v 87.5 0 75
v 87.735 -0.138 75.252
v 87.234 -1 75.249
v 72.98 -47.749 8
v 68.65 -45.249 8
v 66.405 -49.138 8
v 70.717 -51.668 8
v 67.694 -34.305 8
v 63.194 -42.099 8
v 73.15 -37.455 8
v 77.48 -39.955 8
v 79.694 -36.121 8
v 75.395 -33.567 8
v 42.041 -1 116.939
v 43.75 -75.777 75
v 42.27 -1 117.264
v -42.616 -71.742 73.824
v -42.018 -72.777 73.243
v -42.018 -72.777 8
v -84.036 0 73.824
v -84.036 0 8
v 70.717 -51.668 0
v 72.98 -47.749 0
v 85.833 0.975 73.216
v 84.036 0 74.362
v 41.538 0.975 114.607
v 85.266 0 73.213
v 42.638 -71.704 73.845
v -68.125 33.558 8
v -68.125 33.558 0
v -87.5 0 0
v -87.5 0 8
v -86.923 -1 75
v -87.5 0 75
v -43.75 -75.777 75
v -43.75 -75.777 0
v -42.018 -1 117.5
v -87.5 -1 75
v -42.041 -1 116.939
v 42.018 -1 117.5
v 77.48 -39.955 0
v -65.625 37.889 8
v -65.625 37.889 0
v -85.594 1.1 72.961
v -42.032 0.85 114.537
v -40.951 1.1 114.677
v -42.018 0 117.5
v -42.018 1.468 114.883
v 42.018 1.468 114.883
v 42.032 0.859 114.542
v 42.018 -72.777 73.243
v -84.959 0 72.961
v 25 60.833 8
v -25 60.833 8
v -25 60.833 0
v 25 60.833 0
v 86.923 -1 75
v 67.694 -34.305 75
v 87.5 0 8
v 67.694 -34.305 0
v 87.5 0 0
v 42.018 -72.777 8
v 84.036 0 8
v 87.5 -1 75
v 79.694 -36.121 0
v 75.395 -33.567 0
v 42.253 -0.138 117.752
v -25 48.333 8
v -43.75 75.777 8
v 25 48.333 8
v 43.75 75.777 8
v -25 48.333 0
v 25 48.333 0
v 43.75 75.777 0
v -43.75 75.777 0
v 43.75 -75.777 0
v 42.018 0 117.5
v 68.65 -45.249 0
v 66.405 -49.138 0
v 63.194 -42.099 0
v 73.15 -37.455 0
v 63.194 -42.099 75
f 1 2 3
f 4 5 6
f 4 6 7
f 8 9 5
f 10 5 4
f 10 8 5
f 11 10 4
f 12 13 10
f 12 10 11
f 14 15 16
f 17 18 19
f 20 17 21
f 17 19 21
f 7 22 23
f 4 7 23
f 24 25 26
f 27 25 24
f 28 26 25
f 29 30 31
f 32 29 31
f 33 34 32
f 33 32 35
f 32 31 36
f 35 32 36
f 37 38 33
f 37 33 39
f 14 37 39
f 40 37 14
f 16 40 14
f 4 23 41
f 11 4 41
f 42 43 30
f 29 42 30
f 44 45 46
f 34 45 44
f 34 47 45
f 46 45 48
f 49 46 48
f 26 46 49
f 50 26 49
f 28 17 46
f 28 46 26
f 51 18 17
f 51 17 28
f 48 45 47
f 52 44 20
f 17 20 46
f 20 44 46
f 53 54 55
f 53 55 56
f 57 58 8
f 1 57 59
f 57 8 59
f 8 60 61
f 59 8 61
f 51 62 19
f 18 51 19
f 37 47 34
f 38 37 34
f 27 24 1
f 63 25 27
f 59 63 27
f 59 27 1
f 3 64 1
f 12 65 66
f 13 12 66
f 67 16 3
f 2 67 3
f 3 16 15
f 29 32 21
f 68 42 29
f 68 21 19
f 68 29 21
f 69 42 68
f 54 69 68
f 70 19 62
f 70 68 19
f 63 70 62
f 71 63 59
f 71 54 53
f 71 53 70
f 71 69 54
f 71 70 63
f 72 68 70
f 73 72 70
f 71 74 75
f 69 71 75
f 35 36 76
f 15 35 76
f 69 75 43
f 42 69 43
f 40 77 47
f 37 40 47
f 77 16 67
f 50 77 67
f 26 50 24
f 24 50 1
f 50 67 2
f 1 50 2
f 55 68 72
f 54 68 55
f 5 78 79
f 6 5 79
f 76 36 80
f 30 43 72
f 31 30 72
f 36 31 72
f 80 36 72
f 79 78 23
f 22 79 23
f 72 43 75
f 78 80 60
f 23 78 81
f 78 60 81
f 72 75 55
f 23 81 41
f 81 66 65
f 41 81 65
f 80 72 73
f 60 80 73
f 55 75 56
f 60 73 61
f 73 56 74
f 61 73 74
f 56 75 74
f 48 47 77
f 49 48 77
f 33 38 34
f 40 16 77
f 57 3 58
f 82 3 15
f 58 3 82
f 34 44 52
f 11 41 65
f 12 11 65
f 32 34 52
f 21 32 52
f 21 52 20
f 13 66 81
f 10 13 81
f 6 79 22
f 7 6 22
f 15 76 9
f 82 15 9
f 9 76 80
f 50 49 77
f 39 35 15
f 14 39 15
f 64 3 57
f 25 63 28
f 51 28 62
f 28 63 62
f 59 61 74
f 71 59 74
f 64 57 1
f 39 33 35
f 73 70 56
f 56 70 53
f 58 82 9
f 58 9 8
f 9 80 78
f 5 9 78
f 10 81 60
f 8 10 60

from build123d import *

# Parameters (mm, degrees)
F0_W      = 50
F0_H      = 12.5
F1_DEPTH  = 8
F2_DEPTH  = 75
F4_DEPTH  = 8
F7_DEPTH  = 3
F8_DEPTH  = 1
F11_DEPTH = 3
F14_DEPTH = 3
F15_DEPTH = 8
F16_DEPTH = 8
F17_DEPTH = 12.5
F18_DEPTH = 8


# Not quite as in the source:
# - a feature names something its author has since deleted; it is built from what else it names


with BuildPart() as f1:
    # F0 (on Top) → F1 (new body)
    with BuildSketch(Plane.XY):
        Polygon((42.0179491924, -72.7772228311), (84.0358983849, 0), (42.0179491924, 72.7772228311), (-42.0179491924, 72.7772228311), (-84.0358983849, 0), (-42.0179491924, -72.7772228311), align=None)
        with Locations((0, 54.5829171234)):
            Rectangle(F0_W, F0_H, mode=Mode.SUBTRACT)
    extrude(amount=F1_DEPTH)

    # F0 (on Top) → F2 (join)
    with BuildSketch(Plane.XY):
        Polygon((67.6939940411, -34.3050086158), (87.5, 0), (84.0358983849, 0), (42.0179491924, -72.7772228311), (-42.0179491924, -72.7772228311), (-84.0358983849, 0), (-87.5, 0), (-43.75, -75.7772228311), (43.75, -75.7772228311), (63.1939940411, -42.0992372499), align=None)
    extrude(amount=F2_DEPTH)

    # F0 (on Top) → F4 (join)
    with BuildSketch(Plane.XY):
        Polygon((43.75, 75.7772228311), (-43.75, 75.7772228311), (-65.625, 37.8886114156), (-68.125, 33.5584843966), (-87.5, 0), (-84.0358983849, 0), (-42.0179491924, 72.7772228311), (42.0179491924, 72.7772228311), (84.0358983849, 0), (87.5, 0), align=None)
    extrude(amount=F4_DEPTH)

    # F6 (on face) → F7 (join)
    with BuildSketch(Plane(origin=(0, -50.1312366318, 89.3836679776), x_dir=(1, 0, 0), z_dir=(0, 0.4891706574, -0.872188092))):
        Polygon((43.75, 29.4041920927), (0, 29.4041920927), (-43.75, 29.4041920927), (-42.01795, -57.4775522498), (42.01795, -57.4775522498), align=None)
    extrude(amount=F7_DEPTH)

    # F3 (on Front) → F8 (join)
    with BuildSketch(Plane.XZ):
        Polygon((-42.01795, 114.5), (0, 114.5), (42.01795, 114.5), (84.0359, 75), (87.5, 75), (42.01795, 117.5), (0, 117.5), (-42.01795, 117.5), (-87.5, 75), (-84.0359, 75), align=None)
    extrude(amount=F8_DEPTH)

    # F10 (on face) → F11 (join)
    with BuildSketch(Plane(origin=(-67.6846727043, -39.0777640058, 72.4338274863), x_dir=(0.7723629594, -0.3015876344, 0.5590173143), z_dir=(-0.6351814378, -0.3667221741, 0.6797495039))):
        Polygon((33.2314262259, 55.789645187), (-25.6554603702, 35.6104118215), (30.9888924807, -31.0804218073), align=None)
    extrude(amount=-F11_DEPTH)

    # F13 (on face) → F14 (join)
    with BuildSketch(Plane(origin=(67.6756688636, -39.5950852503, 72.4241918832), x_dir=(0.7733047167, 0.3041472681, -0.556322078), z_dir=(-0.6340345536, 0.3709553614, -0.6785221475))):
        Polygon((-30.939509805, 30.5117392321), (-32.8751652468, -56.3649154418), (25.9400068576, -35.9776056011), align=None)
    extrude(amount=F14_DEPTH)

    # F0 (on Top) → F15 (join)
    with BuildSketch(Plane.XY):
        with Locations((0, 54.5829171234)):
            Rectangle(F0_W, F0_H)
    extrude(amount=F15_DEPTH)

    # F0 (on Top) → F16 (join)
    with BuildSketch(Plane.XY):
        Polygon((75.395275497, -33.566783298), (73.1502941936, -37.4552049777), (77.4800811039, -39.9550086158), (79.6937291893, -36.1208576617), align=None)
        Polygon((73.1502941936, -37.4552049777), (67.6939940411, -34.3050086158), (63.1939940411, -42.0992372499), (68.6500615294, -45.249299283), (72.9800811039, -47.7492372499), (77.4800811039, -39.9550086158), align=None)
    extrude(amount=F16_DEPTH)

    # F0 (on Top) → F17 (cut, symmetric)
    with BuildSketch(Plane.XY):
        with Locations((0, 54.5829171234)):
            Rectangle(F0_W, F0_H)
    extrude(amount=F17_DEPTH, both=True, mode=Mode.SUBTRACT)

    # F0 (on Top) → F18 (join)
    with BuildSketch(Plane.XY):
        Polygon((72.9800811039, -47.7492372499), (68.6500615294, -45.249299283), (66.405071243, -49.1377365216), (70.7174794095, -51.6681783419), align=None)
    extrude(amount=F18_DEPTH)


solid = f1.part
